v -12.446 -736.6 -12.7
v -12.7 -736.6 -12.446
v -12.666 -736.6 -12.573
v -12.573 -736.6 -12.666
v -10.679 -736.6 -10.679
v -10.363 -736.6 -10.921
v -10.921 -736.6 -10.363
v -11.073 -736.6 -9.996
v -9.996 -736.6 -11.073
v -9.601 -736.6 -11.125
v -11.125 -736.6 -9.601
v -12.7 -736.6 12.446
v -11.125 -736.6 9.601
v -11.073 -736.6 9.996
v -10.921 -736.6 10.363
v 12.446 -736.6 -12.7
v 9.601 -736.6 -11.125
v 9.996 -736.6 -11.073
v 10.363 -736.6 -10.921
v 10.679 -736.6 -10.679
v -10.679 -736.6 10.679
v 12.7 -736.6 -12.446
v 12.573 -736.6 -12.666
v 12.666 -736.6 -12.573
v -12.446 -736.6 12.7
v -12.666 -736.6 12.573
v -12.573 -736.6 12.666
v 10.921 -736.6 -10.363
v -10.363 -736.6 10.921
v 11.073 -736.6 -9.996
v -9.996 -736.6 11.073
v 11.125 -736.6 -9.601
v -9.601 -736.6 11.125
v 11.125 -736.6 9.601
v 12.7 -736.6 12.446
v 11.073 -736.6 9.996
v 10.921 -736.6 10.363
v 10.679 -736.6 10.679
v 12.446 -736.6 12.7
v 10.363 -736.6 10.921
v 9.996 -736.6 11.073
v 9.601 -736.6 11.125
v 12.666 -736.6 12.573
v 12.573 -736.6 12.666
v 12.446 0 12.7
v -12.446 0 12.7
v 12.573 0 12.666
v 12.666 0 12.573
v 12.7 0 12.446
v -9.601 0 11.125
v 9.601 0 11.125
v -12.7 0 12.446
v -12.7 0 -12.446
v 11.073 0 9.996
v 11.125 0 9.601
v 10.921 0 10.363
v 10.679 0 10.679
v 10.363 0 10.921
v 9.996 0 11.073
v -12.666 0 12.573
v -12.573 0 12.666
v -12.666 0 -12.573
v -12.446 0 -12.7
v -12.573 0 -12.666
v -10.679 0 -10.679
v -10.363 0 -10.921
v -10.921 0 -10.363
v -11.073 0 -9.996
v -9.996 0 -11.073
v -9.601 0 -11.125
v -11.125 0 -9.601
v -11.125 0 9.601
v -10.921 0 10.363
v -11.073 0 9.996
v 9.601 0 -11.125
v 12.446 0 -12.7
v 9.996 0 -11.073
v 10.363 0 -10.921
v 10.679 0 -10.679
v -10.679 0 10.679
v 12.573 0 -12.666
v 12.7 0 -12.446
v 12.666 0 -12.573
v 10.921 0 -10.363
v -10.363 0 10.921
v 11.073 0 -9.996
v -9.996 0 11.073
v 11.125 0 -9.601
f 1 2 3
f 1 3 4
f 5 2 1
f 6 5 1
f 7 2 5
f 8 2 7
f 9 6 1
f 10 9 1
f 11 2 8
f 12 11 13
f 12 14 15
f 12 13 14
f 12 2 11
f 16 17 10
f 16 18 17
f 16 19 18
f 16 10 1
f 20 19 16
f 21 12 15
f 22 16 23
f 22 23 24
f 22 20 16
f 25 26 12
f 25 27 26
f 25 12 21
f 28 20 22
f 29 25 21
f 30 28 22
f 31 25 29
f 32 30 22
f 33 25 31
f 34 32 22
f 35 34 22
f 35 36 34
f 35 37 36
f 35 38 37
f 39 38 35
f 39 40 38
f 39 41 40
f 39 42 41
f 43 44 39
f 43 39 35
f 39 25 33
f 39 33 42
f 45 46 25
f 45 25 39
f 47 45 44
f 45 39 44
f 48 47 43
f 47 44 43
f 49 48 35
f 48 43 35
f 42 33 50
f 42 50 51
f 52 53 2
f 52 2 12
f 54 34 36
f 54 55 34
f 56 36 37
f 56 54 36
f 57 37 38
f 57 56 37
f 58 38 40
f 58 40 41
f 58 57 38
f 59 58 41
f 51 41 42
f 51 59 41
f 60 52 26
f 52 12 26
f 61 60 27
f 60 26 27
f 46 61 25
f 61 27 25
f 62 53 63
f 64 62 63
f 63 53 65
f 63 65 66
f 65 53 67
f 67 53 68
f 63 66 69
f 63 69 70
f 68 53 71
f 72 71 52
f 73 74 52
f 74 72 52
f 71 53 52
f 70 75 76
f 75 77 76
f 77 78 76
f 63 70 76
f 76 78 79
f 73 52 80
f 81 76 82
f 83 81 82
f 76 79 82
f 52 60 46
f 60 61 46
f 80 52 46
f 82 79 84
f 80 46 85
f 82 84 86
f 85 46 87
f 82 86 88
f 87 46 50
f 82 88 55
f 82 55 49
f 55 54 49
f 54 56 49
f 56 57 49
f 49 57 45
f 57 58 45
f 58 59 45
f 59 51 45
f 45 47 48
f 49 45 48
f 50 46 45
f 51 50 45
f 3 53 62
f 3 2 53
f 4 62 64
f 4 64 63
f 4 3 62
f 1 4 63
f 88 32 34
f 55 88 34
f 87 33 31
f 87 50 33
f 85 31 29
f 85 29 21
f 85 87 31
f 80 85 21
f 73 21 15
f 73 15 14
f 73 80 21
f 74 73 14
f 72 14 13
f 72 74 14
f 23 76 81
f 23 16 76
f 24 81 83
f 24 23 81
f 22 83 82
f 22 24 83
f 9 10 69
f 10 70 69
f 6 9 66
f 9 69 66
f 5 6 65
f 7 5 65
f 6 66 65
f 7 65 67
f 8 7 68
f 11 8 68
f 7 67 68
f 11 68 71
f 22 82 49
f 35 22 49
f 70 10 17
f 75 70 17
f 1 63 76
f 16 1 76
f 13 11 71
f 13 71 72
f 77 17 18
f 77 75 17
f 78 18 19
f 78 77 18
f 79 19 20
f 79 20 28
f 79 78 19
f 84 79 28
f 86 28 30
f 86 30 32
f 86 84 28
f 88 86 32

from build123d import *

# Parameters (mm, degrees)
F0_W     = 25.4
F0_H     = 25.4
F1_DEPTH = 736.6
F2_W     = 22.2504
F2_H     = 22.2504
F3_DEPTH = 736.6
F4_R     = 1.524
F5_R     = 0.254


with BuildPart() as f1:
    # F0 (on Front) → F1 (new body)
    with BuildSketch(Plane.XZ):
        Rectangle(F0_W, F0_H)
    extrude(amount=F1_DEPTH)

    # F2 (on face) → F3 (cut, through all)
    with BuildSketch(Plane.XZ.offset(736.6)):
        Rectangle(F2_W, F2_H)
    extrude(amount=-F3_DEPTH, mode=Mode.SUBTRACT)

    # F4
    f4_edges = [f1.edges().sort_by_distance(p)[0] for p in [
        (-11.1252, -368.3, 11.1252),
        (11.1252, -368.3, -11.1252),
        (11.1252, -368.3, 11.1252),
        (-11.1252, -368.3, -11.1252),
    ]]
    fillet(f4_edges, radius=F4_R)

    # F5
    f5_edges = [f1.edges().sort_by_distance(p)[0] for p in [
        (12.7, -368.3, 12.7),
        (12.7, -368.3, -12.7),
        (-12.7, -368.3, -12.7),
        (-12.7, -368.3, 12.7),
    ]]
    fillet(f5_edges, radius=F5_R)


solid = f1.part
